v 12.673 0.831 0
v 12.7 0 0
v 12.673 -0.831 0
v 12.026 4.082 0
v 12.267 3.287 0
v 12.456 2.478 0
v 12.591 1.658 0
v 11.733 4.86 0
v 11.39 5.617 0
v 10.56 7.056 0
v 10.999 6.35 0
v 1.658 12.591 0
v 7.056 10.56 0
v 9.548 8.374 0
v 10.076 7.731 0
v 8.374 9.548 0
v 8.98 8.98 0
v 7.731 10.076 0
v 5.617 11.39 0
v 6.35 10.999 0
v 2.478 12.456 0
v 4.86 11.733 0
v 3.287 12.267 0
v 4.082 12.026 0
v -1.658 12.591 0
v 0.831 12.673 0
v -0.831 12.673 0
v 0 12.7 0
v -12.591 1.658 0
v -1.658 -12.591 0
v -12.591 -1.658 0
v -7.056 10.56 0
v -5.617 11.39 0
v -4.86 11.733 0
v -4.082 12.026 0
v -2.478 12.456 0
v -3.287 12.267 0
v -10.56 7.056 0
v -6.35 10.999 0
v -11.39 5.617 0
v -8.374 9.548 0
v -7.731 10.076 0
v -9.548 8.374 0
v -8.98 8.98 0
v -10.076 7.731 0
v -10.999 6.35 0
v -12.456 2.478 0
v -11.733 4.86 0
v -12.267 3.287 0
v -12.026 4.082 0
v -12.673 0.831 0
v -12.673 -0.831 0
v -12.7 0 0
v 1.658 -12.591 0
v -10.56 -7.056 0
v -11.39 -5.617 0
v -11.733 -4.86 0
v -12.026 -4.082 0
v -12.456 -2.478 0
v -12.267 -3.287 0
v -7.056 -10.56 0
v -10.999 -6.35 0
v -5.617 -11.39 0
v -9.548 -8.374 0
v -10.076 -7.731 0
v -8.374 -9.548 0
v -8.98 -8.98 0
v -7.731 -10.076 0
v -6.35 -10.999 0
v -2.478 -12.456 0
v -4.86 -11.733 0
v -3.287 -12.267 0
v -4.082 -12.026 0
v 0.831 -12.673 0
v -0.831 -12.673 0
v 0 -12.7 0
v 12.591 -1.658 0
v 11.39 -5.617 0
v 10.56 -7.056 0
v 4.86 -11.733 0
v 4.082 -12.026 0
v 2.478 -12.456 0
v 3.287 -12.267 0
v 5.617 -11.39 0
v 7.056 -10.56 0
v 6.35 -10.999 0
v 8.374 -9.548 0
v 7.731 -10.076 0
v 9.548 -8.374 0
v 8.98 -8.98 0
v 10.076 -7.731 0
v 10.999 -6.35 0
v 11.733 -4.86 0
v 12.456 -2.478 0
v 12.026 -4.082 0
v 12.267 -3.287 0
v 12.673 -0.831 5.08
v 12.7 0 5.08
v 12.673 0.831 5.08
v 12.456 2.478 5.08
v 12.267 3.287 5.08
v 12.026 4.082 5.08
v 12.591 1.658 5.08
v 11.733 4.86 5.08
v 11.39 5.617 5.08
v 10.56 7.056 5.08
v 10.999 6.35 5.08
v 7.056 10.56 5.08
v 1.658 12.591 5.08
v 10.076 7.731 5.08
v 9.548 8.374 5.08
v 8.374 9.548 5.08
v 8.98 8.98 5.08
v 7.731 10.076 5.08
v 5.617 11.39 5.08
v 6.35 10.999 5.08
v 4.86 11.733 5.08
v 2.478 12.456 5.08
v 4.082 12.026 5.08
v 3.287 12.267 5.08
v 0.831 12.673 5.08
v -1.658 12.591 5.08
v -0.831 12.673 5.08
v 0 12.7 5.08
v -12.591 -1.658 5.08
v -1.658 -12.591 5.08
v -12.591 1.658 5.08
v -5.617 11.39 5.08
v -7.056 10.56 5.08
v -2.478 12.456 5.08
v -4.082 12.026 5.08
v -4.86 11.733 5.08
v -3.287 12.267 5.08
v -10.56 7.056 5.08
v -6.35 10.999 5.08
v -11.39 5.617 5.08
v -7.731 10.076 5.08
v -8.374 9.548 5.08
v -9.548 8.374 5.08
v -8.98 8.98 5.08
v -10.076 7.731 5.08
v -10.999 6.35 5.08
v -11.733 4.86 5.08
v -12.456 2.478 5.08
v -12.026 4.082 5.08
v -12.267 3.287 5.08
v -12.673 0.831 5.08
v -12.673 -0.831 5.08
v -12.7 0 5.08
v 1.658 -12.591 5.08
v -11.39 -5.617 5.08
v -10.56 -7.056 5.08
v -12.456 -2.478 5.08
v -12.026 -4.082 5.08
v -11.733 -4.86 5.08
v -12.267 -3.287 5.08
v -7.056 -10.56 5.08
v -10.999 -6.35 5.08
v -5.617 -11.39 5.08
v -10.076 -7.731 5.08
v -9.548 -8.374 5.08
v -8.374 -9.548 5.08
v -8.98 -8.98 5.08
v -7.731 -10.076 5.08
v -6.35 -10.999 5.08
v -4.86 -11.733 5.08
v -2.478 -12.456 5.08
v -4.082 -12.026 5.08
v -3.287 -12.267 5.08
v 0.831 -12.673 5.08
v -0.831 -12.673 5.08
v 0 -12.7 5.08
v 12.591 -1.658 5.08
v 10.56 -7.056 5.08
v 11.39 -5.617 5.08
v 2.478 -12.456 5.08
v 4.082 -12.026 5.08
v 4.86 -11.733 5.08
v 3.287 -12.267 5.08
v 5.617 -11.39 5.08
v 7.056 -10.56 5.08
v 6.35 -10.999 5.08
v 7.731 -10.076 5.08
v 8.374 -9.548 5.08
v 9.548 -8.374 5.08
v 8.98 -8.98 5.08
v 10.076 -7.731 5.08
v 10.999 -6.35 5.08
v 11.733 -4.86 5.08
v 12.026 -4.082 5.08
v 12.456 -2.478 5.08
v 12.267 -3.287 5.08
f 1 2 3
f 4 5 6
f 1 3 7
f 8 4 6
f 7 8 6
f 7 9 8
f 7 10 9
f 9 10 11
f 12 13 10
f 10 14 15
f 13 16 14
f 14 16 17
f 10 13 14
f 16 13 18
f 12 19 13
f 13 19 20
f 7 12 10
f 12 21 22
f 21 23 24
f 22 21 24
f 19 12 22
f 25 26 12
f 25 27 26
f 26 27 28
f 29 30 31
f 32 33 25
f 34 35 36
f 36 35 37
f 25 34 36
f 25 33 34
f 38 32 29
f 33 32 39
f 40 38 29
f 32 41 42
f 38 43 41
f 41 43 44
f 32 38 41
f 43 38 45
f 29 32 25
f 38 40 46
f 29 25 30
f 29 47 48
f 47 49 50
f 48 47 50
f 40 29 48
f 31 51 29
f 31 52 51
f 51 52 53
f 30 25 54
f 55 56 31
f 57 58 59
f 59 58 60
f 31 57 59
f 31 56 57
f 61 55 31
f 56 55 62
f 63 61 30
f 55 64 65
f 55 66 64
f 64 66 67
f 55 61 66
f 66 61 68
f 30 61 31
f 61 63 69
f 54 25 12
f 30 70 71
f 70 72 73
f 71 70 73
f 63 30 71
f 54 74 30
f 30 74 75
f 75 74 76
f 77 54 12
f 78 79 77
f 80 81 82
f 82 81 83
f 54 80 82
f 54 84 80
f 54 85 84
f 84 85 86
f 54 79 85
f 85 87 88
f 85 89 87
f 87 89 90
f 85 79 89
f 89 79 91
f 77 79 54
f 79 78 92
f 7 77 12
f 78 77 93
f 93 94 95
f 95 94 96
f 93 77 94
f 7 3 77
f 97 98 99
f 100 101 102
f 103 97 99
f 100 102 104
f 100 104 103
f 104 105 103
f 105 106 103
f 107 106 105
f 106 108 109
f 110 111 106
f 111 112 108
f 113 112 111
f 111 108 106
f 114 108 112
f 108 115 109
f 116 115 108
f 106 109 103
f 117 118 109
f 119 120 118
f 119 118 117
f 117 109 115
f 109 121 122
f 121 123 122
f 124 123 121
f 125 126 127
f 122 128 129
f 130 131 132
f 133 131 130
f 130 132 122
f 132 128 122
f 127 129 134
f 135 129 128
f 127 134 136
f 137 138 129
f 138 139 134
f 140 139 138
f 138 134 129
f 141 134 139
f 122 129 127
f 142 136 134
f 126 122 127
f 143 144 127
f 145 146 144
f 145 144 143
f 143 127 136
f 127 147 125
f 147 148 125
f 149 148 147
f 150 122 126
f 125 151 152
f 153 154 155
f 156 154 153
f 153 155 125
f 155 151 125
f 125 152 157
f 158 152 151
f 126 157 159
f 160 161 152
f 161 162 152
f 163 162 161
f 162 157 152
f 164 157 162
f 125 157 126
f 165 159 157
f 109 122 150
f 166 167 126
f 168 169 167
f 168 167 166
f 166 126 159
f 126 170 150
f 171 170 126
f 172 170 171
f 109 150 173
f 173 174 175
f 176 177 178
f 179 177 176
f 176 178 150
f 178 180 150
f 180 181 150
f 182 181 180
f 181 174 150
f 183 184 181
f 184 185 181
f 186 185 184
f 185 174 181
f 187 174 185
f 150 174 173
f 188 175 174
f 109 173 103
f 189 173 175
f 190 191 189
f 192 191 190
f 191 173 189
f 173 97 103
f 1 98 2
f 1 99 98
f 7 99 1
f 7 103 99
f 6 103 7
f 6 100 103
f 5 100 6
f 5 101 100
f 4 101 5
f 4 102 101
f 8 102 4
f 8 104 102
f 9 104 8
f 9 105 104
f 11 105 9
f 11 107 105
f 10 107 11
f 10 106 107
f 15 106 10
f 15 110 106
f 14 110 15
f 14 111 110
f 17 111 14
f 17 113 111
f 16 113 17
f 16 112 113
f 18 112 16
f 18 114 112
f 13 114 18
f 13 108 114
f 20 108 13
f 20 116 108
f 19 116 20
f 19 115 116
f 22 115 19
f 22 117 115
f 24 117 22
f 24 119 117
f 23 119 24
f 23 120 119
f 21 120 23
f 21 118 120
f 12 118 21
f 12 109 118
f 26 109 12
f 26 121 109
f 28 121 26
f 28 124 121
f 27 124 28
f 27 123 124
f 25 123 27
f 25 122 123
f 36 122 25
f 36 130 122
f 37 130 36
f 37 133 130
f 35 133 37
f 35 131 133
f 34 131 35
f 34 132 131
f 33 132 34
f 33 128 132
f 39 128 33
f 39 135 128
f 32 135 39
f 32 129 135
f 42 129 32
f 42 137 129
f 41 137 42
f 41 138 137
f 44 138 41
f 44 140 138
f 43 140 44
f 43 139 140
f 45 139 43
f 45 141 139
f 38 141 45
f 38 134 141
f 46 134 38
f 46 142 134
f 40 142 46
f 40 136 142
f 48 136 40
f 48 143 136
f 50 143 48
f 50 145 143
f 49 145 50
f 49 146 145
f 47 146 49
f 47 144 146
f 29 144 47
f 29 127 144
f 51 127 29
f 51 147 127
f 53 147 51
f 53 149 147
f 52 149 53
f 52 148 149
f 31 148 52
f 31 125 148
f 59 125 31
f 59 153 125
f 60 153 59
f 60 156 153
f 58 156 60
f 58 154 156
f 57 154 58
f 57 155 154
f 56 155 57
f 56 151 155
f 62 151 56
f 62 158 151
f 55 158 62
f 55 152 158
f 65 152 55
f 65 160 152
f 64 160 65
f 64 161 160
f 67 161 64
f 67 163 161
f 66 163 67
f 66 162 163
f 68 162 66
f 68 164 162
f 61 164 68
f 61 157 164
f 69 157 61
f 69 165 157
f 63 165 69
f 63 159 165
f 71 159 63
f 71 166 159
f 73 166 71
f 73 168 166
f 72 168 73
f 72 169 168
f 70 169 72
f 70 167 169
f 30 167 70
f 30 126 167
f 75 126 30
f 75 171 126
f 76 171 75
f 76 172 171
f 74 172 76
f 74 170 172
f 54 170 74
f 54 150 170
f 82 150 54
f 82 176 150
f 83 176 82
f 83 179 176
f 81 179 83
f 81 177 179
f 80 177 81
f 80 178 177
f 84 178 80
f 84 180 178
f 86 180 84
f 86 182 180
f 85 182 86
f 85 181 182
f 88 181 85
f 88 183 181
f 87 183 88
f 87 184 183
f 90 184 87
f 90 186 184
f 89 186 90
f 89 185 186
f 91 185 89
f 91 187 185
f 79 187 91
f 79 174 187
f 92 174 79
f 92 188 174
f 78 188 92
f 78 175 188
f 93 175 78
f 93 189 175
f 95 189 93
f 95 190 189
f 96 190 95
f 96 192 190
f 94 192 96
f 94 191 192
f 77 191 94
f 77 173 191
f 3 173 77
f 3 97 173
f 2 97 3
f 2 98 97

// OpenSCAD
ViewScale = [0.0254, 0.0254, 0.0254];

module distances()
{
    linear_extrude(200)
    circle(500, $fn=96);
}

scale(ViewScale)
{
    distances();
}
